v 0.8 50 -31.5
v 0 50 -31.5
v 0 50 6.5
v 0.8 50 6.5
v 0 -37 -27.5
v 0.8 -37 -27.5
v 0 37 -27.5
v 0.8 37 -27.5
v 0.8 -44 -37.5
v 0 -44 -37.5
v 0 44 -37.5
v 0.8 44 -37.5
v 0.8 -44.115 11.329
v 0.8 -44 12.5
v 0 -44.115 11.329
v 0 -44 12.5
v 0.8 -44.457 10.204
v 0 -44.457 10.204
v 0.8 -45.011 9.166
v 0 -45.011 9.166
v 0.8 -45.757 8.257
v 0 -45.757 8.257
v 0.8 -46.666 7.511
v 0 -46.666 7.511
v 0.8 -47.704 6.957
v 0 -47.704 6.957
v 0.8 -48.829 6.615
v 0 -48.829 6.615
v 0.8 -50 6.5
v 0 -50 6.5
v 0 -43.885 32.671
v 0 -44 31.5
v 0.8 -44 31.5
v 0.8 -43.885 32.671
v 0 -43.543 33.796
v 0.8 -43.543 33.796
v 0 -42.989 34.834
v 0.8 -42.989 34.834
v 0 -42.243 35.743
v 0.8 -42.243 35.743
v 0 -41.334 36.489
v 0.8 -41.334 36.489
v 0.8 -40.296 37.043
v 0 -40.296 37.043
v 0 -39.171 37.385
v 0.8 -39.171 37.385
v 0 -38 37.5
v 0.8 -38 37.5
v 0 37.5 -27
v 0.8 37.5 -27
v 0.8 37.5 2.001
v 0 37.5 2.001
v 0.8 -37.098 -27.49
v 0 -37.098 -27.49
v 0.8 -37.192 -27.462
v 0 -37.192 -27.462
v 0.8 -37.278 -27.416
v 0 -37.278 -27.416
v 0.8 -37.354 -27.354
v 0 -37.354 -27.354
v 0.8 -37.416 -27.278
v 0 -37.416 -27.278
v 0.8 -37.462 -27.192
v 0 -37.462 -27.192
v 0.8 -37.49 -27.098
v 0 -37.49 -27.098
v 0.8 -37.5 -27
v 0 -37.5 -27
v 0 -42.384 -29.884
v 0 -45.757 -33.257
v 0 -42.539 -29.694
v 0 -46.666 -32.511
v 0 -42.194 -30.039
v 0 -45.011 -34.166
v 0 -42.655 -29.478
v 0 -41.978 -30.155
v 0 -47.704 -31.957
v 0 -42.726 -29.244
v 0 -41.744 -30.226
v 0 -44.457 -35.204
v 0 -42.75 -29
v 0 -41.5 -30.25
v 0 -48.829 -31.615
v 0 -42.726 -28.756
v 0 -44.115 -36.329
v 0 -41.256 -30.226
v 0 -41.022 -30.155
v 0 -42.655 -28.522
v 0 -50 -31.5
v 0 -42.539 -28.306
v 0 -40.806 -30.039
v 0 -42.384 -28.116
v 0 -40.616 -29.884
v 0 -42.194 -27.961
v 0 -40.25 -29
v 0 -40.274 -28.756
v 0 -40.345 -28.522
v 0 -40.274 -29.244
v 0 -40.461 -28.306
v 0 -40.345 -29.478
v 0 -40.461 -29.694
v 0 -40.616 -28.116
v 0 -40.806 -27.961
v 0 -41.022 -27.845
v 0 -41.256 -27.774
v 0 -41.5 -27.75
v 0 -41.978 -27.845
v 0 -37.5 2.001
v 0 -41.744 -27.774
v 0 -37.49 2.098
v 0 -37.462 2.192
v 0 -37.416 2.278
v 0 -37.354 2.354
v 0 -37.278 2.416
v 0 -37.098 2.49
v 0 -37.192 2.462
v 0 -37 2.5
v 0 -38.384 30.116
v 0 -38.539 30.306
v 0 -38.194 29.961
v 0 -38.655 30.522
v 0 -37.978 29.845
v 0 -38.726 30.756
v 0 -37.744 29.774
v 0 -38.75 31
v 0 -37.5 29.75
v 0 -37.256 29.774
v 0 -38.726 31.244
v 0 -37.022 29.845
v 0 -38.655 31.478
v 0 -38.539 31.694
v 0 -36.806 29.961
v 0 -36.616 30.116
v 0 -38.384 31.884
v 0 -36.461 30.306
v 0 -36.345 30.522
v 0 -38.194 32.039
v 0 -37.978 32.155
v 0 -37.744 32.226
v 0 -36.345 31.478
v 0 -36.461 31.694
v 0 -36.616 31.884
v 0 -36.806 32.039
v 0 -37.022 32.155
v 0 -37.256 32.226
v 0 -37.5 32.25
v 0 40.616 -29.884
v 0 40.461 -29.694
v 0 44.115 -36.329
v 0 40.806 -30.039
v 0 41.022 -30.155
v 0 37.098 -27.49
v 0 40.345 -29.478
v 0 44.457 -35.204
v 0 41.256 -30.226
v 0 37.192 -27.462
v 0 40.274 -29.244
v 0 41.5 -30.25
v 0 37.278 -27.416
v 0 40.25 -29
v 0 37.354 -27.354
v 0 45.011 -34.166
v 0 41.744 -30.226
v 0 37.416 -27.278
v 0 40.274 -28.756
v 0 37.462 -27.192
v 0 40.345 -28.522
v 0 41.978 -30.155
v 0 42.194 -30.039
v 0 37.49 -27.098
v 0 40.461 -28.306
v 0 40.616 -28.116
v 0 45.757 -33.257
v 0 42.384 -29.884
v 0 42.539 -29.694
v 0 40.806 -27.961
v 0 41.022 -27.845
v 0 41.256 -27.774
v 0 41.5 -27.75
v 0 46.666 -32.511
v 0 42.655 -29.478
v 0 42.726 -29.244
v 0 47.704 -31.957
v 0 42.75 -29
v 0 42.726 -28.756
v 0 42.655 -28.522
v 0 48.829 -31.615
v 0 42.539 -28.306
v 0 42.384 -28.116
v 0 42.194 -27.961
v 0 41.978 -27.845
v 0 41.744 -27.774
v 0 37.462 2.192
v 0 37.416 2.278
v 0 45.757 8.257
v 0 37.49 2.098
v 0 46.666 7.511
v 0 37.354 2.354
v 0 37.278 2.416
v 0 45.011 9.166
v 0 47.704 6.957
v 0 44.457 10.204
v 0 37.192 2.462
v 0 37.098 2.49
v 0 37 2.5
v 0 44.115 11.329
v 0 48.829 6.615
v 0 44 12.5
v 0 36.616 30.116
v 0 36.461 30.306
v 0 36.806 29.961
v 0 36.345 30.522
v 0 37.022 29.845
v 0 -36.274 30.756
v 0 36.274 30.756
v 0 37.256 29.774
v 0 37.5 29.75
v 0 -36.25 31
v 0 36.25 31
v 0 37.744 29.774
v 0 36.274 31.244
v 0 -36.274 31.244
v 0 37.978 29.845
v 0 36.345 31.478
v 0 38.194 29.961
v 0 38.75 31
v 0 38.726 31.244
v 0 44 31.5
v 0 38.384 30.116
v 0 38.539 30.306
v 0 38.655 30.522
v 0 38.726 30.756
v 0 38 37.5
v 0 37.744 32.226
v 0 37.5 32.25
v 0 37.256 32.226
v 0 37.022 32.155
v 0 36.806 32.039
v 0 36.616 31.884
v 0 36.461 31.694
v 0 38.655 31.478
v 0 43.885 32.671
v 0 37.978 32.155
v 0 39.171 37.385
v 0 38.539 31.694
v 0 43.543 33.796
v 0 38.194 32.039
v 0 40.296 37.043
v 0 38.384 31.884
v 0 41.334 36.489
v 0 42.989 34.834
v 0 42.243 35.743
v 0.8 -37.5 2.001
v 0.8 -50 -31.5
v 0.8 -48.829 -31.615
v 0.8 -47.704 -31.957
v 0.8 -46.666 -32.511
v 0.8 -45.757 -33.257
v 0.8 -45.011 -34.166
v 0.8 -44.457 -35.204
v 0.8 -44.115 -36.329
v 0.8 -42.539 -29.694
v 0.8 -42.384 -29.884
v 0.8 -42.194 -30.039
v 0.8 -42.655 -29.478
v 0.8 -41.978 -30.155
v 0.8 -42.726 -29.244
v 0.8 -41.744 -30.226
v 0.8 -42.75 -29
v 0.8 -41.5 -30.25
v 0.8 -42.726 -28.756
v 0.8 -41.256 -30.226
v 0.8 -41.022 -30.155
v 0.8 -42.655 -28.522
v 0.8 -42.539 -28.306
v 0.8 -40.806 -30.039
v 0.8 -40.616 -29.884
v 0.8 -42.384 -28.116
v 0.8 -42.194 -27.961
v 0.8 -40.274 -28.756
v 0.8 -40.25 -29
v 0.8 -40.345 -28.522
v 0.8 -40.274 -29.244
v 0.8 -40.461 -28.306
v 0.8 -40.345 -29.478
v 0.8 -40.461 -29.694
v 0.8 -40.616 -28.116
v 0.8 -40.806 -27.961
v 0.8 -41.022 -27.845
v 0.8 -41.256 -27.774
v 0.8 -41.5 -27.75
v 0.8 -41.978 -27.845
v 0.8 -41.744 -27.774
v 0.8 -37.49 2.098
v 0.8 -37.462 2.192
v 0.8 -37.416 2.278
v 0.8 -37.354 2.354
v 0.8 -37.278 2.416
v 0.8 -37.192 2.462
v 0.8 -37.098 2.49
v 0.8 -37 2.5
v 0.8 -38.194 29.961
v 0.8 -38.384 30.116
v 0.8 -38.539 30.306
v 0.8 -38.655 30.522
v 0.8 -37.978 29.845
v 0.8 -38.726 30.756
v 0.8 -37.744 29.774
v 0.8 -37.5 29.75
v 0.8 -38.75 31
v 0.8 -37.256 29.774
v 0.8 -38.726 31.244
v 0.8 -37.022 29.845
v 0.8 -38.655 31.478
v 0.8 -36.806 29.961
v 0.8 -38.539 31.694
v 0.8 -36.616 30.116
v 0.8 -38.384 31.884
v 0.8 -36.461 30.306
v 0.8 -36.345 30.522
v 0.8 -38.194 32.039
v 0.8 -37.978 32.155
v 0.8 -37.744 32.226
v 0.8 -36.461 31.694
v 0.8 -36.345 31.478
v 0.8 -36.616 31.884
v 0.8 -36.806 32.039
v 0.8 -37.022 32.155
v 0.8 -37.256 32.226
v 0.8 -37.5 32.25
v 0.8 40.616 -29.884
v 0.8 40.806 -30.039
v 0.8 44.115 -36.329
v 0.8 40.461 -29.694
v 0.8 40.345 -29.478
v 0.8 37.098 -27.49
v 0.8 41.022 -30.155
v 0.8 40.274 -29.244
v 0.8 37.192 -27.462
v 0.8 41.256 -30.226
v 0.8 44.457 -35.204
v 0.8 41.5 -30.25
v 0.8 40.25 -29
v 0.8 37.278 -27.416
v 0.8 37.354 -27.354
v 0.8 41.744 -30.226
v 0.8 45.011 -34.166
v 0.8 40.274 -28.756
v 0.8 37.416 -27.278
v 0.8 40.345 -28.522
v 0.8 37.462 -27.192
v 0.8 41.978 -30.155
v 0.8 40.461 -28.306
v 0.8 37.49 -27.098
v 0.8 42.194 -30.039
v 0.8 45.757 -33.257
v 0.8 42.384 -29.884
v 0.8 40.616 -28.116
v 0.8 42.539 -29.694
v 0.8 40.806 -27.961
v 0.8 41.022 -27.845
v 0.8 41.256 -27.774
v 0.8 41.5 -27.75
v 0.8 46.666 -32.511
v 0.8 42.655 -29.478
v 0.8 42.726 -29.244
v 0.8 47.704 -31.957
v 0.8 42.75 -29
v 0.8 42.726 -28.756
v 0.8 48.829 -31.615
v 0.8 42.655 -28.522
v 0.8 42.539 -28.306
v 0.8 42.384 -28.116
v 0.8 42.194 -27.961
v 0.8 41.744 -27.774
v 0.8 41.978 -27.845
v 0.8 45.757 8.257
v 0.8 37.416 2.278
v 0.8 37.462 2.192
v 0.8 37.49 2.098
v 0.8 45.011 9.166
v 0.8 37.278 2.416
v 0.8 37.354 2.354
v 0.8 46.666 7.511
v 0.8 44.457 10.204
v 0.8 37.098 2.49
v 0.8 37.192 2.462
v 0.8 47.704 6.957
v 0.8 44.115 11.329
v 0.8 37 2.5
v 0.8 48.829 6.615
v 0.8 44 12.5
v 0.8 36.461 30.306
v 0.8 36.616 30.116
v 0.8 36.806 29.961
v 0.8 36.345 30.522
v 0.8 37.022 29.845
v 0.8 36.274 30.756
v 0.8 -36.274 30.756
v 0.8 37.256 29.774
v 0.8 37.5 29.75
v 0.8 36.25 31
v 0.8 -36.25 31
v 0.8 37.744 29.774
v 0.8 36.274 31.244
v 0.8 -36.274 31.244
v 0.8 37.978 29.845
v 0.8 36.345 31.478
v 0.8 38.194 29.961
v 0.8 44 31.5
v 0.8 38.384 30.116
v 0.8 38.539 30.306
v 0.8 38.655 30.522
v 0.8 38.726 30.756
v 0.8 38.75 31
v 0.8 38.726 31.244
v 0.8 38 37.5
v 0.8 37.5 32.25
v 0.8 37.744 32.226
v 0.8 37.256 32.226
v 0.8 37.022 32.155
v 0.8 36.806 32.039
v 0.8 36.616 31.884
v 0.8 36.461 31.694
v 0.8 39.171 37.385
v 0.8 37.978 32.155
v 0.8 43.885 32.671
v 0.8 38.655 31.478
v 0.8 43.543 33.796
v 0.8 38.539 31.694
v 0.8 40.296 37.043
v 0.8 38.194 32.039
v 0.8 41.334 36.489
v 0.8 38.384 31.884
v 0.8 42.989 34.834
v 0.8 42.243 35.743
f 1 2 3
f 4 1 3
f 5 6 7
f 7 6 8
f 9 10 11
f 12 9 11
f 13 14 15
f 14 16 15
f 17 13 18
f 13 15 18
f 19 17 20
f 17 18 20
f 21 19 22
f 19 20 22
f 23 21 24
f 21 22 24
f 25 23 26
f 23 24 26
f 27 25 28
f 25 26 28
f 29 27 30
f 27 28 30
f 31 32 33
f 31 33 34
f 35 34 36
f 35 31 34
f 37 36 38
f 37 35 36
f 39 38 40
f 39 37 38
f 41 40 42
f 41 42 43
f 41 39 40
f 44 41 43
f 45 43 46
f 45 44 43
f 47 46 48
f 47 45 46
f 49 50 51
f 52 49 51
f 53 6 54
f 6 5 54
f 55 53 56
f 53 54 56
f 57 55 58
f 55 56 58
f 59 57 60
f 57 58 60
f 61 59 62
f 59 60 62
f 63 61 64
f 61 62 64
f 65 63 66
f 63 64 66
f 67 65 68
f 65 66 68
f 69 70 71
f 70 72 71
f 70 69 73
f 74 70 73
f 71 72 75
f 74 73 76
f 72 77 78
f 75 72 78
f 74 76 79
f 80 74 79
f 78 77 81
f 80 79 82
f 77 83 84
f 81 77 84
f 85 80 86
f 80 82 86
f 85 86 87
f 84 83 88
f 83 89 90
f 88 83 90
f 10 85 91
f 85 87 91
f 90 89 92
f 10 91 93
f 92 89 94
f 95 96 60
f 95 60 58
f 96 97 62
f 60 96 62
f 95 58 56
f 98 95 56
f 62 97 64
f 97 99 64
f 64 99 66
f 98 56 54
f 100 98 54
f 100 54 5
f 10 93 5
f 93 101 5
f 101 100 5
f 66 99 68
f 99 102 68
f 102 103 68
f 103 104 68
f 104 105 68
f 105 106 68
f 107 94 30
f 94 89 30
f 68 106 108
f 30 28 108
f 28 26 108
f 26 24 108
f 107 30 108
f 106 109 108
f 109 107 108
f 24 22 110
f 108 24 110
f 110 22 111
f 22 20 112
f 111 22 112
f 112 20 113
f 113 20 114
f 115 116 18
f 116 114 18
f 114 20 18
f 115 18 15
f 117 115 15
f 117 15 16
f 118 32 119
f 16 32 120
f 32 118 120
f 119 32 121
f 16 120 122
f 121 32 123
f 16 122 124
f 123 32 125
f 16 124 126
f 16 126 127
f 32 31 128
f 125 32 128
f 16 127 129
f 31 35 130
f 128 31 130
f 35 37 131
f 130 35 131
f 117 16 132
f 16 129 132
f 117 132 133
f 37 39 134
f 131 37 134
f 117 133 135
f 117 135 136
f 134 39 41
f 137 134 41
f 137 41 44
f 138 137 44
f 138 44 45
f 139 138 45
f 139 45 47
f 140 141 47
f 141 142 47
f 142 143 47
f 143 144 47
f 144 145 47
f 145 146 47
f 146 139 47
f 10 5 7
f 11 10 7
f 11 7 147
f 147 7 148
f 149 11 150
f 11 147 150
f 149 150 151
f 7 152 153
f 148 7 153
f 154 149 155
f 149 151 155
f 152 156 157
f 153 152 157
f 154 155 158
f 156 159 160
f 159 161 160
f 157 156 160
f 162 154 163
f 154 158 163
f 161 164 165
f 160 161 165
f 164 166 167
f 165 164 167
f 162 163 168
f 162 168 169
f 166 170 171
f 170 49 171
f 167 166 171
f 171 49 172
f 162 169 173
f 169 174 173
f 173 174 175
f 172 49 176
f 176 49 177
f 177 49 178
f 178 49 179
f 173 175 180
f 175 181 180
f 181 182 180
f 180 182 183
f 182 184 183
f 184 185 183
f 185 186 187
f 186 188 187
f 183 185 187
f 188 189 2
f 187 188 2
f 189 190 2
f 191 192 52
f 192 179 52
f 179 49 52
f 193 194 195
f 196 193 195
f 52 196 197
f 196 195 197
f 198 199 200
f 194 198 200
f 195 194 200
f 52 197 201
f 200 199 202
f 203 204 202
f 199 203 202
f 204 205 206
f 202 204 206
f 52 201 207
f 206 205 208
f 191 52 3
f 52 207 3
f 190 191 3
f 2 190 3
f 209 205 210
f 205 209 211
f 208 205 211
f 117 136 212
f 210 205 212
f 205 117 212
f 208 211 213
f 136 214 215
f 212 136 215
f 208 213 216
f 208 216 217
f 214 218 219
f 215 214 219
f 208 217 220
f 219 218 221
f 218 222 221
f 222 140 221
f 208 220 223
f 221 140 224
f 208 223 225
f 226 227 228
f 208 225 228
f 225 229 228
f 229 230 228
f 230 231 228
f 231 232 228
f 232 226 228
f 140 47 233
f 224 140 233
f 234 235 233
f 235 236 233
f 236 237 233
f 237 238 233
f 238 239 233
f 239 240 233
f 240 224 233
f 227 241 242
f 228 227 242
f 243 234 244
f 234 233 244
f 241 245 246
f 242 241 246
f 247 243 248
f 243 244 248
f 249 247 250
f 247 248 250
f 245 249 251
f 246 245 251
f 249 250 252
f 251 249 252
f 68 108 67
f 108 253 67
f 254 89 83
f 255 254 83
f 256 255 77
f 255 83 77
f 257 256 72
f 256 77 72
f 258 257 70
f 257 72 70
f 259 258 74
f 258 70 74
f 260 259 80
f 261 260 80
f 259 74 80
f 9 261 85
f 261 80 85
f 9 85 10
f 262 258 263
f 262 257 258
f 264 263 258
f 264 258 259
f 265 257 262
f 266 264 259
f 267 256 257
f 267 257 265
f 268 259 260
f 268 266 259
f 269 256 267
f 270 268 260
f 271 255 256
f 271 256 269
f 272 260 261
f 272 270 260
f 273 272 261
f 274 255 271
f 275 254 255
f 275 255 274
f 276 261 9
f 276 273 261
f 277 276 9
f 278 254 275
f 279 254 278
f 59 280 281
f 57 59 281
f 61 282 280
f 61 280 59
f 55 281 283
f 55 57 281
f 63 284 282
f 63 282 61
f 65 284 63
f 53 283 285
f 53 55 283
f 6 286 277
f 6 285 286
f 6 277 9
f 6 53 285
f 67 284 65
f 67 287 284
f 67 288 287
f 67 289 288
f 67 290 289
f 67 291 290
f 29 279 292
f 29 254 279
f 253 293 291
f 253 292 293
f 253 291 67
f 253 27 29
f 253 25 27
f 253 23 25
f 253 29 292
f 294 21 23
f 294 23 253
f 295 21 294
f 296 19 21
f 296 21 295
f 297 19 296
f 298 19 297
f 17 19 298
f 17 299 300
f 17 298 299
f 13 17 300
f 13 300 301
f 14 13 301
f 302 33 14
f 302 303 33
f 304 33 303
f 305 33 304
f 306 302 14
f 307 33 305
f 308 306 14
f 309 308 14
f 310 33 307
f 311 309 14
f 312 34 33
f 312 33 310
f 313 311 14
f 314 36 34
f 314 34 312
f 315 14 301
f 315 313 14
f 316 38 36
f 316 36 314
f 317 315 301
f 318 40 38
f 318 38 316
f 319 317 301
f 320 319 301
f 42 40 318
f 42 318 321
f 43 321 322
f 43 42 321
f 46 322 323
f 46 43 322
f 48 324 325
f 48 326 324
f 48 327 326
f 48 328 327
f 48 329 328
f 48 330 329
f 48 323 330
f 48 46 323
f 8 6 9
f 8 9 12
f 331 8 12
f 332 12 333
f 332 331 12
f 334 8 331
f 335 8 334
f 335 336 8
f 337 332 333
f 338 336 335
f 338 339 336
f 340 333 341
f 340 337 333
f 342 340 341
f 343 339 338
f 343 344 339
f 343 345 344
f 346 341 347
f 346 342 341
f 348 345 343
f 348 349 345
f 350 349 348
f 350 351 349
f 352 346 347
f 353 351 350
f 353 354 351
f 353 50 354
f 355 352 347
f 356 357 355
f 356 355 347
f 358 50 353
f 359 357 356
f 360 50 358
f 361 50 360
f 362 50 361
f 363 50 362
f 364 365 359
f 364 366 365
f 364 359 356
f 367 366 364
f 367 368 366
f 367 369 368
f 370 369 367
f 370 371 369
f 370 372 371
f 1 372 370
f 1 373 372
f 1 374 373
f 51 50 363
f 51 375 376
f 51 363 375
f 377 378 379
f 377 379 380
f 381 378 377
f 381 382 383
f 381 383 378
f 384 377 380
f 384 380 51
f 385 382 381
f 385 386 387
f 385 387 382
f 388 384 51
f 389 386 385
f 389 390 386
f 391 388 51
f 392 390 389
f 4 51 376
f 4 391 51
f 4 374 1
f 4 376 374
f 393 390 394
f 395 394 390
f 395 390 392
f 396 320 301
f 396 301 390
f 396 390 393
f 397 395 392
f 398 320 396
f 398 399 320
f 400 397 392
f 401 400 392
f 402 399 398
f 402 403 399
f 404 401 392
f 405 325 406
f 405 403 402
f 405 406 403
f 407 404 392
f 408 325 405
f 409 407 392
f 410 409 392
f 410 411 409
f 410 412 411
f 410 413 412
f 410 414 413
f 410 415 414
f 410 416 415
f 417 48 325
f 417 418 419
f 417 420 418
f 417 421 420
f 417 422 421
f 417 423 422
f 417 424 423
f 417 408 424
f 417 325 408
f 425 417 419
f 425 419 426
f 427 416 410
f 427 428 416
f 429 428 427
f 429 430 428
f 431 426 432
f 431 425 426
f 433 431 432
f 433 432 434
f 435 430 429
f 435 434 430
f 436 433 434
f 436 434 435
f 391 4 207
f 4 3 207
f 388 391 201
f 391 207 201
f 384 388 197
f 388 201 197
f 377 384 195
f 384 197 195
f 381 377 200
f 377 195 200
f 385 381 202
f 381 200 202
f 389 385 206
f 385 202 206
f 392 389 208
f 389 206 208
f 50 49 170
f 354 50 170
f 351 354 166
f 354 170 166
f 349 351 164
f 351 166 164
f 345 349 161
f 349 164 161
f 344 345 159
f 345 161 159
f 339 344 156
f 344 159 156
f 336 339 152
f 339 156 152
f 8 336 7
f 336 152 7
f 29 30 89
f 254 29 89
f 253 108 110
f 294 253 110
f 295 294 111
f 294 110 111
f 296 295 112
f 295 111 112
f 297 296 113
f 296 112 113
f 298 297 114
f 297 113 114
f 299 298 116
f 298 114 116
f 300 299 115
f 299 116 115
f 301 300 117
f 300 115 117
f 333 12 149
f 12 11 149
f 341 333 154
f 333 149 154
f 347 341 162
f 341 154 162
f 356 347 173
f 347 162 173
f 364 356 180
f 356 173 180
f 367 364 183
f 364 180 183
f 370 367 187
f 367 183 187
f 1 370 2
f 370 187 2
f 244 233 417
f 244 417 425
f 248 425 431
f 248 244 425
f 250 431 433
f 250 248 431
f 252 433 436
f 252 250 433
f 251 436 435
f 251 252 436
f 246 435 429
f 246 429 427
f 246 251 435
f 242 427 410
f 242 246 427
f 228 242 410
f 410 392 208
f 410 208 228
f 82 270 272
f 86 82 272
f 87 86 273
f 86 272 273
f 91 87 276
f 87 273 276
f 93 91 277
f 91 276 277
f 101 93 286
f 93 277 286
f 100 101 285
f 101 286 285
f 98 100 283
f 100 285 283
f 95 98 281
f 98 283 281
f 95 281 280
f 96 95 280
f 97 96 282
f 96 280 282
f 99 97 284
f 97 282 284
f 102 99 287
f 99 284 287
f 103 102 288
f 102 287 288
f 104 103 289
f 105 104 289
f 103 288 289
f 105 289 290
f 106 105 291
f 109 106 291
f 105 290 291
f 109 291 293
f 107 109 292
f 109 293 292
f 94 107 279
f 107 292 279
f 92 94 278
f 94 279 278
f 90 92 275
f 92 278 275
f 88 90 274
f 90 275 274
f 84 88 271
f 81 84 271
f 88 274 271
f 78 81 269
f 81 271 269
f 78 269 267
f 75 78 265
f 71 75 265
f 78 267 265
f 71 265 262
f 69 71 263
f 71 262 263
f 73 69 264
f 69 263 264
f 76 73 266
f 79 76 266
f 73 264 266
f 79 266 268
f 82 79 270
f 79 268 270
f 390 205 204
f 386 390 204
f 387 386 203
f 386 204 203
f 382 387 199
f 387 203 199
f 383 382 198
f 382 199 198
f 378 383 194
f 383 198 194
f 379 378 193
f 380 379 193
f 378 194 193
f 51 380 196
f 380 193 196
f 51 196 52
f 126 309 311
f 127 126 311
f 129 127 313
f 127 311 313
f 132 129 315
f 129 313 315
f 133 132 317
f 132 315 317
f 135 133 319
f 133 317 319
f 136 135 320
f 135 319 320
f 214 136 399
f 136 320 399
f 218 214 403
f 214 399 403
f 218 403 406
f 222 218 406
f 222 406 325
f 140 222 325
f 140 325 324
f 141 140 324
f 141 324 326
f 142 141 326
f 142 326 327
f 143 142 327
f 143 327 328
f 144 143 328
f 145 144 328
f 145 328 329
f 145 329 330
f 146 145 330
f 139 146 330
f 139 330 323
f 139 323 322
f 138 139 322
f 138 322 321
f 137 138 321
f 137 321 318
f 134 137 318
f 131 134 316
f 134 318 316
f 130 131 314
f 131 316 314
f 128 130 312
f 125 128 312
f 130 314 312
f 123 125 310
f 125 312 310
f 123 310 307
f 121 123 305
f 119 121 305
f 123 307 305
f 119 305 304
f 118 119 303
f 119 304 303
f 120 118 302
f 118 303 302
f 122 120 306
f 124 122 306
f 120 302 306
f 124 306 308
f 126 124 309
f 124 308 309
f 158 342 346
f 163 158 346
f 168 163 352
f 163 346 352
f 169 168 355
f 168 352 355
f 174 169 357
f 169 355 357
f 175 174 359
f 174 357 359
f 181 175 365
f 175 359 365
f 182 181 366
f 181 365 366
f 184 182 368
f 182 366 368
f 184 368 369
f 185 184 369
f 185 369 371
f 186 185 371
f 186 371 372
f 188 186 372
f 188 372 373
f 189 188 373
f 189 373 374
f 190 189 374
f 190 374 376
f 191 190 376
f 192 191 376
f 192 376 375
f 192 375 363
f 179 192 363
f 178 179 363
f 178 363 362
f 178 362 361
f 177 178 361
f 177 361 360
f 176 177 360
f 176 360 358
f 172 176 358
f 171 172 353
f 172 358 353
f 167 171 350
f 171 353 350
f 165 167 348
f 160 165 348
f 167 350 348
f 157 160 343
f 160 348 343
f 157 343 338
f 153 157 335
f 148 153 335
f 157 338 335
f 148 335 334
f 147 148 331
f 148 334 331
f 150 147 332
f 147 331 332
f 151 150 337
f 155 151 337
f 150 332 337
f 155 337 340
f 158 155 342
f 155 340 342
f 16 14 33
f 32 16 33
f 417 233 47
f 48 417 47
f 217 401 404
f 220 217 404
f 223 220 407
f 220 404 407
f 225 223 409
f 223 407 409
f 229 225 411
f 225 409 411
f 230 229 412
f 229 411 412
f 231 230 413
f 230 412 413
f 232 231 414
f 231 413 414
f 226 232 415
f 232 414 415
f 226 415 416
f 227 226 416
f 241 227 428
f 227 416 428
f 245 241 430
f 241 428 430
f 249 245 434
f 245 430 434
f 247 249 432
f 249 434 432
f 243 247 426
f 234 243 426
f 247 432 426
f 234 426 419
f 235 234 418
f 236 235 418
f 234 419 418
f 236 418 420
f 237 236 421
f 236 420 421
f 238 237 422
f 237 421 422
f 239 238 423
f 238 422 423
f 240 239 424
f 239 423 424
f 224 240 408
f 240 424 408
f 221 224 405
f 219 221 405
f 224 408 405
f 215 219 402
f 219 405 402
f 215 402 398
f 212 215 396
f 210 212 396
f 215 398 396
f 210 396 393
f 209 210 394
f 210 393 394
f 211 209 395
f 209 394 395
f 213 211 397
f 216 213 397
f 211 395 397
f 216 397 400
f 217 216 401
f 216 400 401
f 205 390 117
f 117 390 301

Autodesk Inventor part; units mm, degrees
ref_plane "YZ Plane" through (0, 0, 0) normal (1, 0, 0) x (0, 1, 0)
ref_plane "XZ Plane" through (0, 0, 0) normal (0, 1, 0) x (-1, 0, 0)
ref_plane "XY Plane" through (0, 0, 0) normal (0, 0, 1) x (1, 0, 0)
sketch "Skizze1" plane through (0, 0, 0) normal (1, 0, 0) x (0, 1, 0)
  line L0 (-50, -37.5) -> (50, -37.5)
  line L1 (50, -37.5) -> (50, 37.5)
  line L2 (50, 37.5) -> (-50, 37.5)
  line L3 (-50, 37.5) -> (-50, -37.5)
  line L4 (-50, -37.5) -> (50, 37.5) construction
  line L5 (50, -37.5) -> (-50, 37.5) construction
  point P0 (0, 0)
  dimension "d0" = 100
  dimension "d1" = 75
extrude "Extrusion1" add sketch "Skizze1" along normal blind 0.8
sketch "Skizze2" plane through (0.8, 0, 0) normal (1, 0, 0) x (0, 0, -1)
  line L0 (-37.5, -50) -> (-6.5, -50)
  line L1 (-6.5, -50) -> (-6.5, -44)
  line L2 (-6.5, -44) -> (-37.5, -44)
  line L3 (-37.5, -44) -> (-37.5, -50)
  line L4 (-37.5, 50) -> (-6.5, 50)
  line L5 (-6.5, 50) -> (-6.5, 44)
  line L6 (-6.5, 44) -> (-37.5, 44)
  line L7 (-37.5, 44) -> (-37.5, 50)
  line L8 (31.5, -50) -> (37.5, -50)
  line L9 (37.5, -50) -> (37.5, -44)
  line L10 (37.5, -44) -> (31.5, -44)
  line L11 (31.5, -44) -> (31.5, -50)
  line L12 (37.5, 50) -> (31.5, 50)
  line L13 (31.5, 50) -> (31.5, 44)
  line L14 (31.5, 44) -> (37.5, 44)
  line L15 (37.5, 44) -> (37.5, 50)
  line L16 (-2.5, -37.5) -> (27.5, -37.5)
  line L17 (27.5, -37.5) -> (27.5, 37.5)
  line L18 (27.5, 37.5) -> (-2.5, 37.5)
  line L19 (-2.5, 37.5) -> (-2.5, -37.5)
  line L20 (52.5, 0) -> (-52.5, 0) construction
  line L21 (-37.5, 50) -> (-37.5, -50) construction
  point P0 (0, 0)
  dimension "d4" = 6
  dimension "d5" = 6
  dimension "d6" = 31
  dimension "d9" = 75
  dimension "d10" = 30
  dimension "d11" = 35
extrude "Extrusion2" cut sketch "Skizze2" against normal through all
fillet "Rundung1" radius 6 6 edges at (0.4, -44, 6.5) (0.4, -44, -31.5) (0.4, 44, -31.5) (0.4, 44, 6.5) (0.4, 44, 37.5) (0.4, -44, 37.5)
fillet "Rundung1" radius 0.5 4 edges at (0.4, -37.5, 2.5) (0.4, -37.5, -27.5) (0.4, 37.5, -27.5) (0.4, 37.5, 2.5)
sketch "Skizze3" plane through (0.8, 0, 0) normal (1, 0, 0) x (0, 0, -1)
  line L0 (-37.5, 50) -> (95.7584, 50) construction
  line L1 (95.7584, 50) -> (95.7584, -50) construction
  line L2 (95.7584, -50) -> (-37.5, -50) construction
  line L3 (-37.5, -50) -> (-37.5, 50) construction
  line L4 (-6.5, -50) -> (31.5, -50) projected
  line L5 (-37.5, 38) -> (-37.5, -38) projected
  point P0 (0, 0)
  dimension "d26" = 100
decal "Aufkleber1"
sketch "Skizze4" plane through (0.8, 0, 0) normal (1, 0, 0) x (0, 0, -1)
  circle A0 centre (-31, -37.5) radius 1.25
  circle A1 centre (-31, 37.5) radius 1.25
  circle A2 centre (29, -41.5) radius 1.25
  circle A3 centre (29, 41.5) radius 1.25
  line L0 (-37.5, 38) -> (-37.5, -38) projected
  line L1 (-31.5, -44) -> (-12.5, -44) projected
  line L2 (52.5, 0) -> (-52.5, 0) construction
  line L3 (-6.5, -50) -> (31.5, -50) construction
  line L4 (37.5, -44) -> (37.5, 44) construction
  point P0 (0, 0)
  dimension "d32" = 6.5
  dimension "d33" = 6.5
  dimension "d34" = 2.5
  dimension "d35" = 8.5
  dimension "d36" = 8.5
extrude "Extrusion3" cut sketch "Skizze4" against normal through all
properties part number "EW_MessingplatteUhrzeit" material "Messing"
